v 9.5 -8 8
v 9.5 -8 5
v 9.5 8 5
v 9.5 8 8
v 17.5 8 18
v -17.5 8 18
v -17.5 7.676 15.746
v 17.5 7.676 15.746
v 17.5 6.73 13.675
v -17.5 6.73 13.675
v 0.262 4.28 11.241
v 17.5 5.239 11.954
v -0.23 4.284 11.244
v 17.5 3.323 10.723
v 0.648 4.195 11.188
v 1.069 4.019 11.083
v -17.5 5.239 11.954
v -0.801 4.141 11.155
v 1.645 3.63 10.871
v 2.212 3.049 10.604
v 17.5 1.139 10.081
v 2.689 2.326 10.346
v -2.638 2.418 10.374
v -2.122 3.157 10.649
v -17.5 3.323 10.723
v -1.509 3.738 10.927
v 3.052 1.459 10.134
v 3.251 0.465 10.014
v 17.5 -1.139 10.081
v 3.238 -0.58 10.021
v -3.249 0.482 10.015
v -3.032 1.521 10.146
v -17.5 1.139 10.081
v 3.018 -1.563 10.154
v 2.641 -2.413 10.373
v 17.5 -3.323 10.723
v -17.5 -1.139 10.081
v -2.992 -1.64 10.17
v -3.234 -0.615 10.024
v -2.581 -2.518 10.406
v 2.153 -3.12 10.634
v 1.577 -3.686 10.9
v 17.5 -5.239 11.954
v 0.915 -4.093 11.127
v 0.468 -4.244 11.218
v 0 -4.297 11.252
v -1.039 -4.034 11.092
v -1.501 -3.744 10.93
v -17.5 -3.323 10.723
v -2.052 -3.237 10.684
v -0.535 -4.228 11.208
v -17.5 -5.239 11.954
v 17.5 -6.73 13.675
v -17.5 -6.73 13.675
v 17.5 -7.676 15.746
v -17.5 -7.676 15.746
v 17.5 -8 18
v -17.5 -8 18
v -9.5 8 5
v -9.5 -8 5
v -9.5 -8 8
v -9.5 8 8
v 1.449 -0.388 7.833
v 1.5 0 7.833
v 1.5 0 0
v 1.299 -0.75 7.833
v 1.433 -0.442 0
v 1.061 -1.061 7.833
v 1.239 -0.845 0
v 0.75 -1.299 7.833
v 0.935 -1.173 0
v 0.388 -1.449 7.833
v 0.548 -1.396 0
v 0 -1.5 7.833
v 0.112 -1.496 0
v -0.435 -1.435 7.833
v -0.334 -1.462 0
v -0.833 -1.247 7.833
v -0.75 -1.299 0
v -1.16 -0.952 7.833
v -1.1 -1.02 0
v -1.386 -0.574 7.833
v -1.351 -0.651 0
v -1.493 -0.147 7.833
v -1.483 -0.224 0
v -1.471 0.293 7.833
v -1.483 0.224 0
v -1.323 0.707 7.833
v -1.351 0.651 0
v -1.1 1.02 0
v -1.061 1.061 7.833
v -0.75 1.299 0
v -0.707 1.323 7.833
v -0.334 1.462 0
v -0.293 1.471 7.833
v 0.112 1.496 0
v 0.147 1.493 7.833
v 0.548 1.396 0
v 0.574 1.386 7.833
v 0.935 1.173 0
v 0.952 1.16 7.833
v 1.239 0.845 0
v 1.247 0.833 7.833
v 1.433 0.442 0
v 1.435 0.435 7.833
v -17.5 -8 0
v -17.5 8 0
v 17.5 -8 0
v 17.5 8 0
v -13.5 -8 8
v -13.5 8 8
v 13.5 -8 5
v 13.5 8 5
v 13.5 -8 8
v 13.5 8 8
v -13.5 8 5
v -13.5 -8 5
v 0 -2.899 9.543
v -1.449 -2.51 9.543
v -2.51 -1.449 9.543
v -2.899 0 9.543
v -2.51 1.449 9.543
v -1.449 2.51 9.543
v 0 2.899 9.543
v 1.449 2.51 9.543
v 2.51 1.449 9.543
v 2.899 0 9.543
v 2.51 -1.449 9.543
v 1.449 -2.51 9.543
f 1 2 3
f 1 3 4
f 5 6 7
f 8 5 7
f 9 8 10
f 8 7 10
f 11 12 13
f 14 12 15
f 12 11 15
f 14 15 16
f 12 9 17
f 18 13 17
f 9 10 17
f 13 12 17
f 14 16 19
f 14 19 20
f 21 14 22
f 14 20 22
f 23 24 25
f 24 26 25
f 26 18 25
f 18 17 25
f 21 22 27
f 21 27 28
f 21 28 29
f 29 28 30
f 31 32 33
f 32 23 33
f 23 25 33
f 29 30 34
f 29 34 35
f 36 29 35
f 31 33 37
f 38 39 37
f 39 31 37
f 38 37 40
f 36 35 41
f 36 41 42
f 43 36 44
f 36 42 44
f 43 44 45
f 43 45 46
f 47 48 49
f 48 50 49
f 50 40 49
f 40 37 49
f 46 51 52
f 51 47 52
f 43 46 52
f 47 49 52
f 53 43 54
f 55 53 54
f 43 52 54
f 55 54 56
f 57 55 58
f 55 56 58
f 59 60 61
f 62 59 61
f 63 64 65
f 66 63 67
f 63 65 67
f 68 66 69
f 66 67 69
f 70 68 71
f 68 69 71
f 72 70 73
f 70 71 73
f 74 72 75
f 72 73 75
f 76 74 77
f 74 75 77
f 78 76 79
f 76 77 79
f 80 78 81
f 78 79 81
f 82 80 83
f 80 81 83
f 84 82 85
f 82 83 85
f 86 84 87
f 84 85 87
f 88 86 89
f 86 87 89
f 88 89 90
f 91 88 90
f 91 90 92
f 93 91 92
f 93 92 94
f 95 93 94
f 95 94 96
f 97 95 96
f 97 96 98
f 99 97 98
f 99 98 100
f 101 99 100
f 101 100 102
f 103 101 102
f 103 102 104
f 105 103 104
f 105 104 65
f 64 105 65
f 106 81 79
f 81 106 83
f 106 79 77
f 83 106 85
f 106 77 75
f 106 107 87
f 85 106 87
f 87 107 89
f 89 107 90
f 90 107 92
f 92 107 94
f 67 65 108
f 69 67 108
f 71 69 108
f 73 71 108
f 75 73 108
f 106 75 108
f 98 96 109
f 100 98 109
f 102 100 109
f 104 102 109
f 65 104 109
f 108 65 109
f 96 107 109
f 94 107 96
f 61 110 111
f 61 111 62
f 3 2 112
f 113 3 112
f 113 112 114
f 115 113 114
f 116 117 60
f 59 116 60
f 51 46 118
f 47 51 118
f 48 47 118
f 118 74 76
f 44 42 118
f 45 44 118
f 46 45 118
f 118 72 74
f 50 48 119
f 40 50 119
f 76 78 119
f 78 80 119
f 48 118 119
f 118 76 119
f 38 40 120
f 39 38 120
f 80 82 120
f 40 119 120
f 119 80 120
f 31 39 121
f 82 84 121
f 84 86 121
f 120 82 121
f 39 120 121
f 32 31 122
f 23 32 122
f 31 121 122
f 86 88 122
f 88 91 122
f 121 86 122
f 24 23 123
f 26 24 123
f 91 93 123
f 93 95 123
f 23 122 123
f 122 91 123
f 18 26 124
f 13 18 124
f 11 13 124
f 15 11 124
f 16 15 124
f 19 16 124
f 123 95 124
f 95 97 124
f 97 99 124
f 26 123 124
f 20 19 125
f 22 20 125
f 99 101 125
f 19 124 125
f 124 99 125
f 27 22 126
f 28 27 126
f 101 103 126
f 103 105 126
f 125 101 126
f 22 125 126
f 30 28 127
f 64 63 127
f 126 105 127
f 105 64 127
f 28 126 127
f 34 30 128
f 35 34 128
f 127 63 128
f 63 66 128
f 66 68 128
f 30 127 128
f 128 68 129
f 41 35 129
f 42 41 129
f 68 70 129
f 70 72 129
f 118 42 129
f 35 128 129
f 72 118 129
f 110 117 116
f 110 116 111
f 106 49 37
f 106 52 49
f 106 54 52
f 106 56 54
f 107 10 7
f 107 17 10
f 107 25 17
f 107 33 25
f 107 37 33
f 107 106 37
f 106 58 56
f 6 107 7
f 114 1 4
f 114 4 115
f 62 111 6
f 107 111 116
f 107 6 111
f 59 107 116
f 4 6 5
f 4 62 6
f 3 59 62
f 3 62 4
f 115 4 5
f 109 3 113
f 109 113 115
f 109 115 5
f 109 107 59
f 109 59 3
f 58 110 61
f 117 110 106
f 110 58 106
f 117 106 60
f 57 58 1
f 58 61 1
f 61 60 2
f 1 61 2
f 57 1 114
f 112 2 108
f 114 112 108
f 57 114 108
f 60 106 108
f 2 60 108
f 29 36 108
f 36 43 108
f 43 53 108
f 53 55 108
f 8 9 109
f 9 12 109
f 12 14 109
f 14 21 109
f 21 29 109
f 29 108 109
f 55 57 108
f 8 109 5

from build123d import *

# Parameters (mm, degrees)
F0_W     = 35
F0_H     = 16
F1_DEPTH = 18
F2_R     = 8
F3_DEPTH = 40
F4_W     = 4
F4_H     = 3
F5_DEPTH = 25
F6_R     = 1.5
F7_DEPTH = 18.001


with BuildPart() as f1:
    # F0 (on Top) → F1 (new body)
    with BuildSketch(Plane.XY):
        Rectangle(F0_W, F0_H)
    extrude(amount=F1_DEPTH)

    # F2 (on face) → F3 (cut)
    with BuildSketch(Plane(origin=(-17.5, 0, 0), x_dir=(0, -1, 0), z_dir=(-1, 0, 0))):
        with Locations((0, 18)):
            Circle(F2_R)
    extrude(amount=-F3_DEPTH, mode=Mode.SUBTRACT)

    # F4 (on face) → F5 (cut)
    with BuildSketch(Plane.XZ.offset(8)):
        with Locations((-11.5, 6.5)):
            Rectangle(F4_W, F4_H)
        with Locations((11.5, 6.5)):
            Rectangle(F4_W, F4_H)
    extrude(amount=-F5_DEPTH, mode=Mode.SUBTRACT)

    # F6 (on face) → F7 (cut, through all)
    with BuildSketch(Plane(origin=(0, 0, 0), x_dir=(1, 0, 0), z_dir=(0, 0, -1))):
        Circle(F6_R)
    extrude(amount=-F7_DEPTH, mode=Mode.SUBTRACT)

    # F8 (on Right) → F9 (revolve, cut)
    with BuildSketch(Plane.YZ):
        Polygon((-4.5, 11.5), (0, 6), (0, 11.5), align=None)
    revolve(axis=Axis((0, 0, 8.75), (0, 0, -1)), mode=Mode.SUBTRACT)


solid = f1.part
